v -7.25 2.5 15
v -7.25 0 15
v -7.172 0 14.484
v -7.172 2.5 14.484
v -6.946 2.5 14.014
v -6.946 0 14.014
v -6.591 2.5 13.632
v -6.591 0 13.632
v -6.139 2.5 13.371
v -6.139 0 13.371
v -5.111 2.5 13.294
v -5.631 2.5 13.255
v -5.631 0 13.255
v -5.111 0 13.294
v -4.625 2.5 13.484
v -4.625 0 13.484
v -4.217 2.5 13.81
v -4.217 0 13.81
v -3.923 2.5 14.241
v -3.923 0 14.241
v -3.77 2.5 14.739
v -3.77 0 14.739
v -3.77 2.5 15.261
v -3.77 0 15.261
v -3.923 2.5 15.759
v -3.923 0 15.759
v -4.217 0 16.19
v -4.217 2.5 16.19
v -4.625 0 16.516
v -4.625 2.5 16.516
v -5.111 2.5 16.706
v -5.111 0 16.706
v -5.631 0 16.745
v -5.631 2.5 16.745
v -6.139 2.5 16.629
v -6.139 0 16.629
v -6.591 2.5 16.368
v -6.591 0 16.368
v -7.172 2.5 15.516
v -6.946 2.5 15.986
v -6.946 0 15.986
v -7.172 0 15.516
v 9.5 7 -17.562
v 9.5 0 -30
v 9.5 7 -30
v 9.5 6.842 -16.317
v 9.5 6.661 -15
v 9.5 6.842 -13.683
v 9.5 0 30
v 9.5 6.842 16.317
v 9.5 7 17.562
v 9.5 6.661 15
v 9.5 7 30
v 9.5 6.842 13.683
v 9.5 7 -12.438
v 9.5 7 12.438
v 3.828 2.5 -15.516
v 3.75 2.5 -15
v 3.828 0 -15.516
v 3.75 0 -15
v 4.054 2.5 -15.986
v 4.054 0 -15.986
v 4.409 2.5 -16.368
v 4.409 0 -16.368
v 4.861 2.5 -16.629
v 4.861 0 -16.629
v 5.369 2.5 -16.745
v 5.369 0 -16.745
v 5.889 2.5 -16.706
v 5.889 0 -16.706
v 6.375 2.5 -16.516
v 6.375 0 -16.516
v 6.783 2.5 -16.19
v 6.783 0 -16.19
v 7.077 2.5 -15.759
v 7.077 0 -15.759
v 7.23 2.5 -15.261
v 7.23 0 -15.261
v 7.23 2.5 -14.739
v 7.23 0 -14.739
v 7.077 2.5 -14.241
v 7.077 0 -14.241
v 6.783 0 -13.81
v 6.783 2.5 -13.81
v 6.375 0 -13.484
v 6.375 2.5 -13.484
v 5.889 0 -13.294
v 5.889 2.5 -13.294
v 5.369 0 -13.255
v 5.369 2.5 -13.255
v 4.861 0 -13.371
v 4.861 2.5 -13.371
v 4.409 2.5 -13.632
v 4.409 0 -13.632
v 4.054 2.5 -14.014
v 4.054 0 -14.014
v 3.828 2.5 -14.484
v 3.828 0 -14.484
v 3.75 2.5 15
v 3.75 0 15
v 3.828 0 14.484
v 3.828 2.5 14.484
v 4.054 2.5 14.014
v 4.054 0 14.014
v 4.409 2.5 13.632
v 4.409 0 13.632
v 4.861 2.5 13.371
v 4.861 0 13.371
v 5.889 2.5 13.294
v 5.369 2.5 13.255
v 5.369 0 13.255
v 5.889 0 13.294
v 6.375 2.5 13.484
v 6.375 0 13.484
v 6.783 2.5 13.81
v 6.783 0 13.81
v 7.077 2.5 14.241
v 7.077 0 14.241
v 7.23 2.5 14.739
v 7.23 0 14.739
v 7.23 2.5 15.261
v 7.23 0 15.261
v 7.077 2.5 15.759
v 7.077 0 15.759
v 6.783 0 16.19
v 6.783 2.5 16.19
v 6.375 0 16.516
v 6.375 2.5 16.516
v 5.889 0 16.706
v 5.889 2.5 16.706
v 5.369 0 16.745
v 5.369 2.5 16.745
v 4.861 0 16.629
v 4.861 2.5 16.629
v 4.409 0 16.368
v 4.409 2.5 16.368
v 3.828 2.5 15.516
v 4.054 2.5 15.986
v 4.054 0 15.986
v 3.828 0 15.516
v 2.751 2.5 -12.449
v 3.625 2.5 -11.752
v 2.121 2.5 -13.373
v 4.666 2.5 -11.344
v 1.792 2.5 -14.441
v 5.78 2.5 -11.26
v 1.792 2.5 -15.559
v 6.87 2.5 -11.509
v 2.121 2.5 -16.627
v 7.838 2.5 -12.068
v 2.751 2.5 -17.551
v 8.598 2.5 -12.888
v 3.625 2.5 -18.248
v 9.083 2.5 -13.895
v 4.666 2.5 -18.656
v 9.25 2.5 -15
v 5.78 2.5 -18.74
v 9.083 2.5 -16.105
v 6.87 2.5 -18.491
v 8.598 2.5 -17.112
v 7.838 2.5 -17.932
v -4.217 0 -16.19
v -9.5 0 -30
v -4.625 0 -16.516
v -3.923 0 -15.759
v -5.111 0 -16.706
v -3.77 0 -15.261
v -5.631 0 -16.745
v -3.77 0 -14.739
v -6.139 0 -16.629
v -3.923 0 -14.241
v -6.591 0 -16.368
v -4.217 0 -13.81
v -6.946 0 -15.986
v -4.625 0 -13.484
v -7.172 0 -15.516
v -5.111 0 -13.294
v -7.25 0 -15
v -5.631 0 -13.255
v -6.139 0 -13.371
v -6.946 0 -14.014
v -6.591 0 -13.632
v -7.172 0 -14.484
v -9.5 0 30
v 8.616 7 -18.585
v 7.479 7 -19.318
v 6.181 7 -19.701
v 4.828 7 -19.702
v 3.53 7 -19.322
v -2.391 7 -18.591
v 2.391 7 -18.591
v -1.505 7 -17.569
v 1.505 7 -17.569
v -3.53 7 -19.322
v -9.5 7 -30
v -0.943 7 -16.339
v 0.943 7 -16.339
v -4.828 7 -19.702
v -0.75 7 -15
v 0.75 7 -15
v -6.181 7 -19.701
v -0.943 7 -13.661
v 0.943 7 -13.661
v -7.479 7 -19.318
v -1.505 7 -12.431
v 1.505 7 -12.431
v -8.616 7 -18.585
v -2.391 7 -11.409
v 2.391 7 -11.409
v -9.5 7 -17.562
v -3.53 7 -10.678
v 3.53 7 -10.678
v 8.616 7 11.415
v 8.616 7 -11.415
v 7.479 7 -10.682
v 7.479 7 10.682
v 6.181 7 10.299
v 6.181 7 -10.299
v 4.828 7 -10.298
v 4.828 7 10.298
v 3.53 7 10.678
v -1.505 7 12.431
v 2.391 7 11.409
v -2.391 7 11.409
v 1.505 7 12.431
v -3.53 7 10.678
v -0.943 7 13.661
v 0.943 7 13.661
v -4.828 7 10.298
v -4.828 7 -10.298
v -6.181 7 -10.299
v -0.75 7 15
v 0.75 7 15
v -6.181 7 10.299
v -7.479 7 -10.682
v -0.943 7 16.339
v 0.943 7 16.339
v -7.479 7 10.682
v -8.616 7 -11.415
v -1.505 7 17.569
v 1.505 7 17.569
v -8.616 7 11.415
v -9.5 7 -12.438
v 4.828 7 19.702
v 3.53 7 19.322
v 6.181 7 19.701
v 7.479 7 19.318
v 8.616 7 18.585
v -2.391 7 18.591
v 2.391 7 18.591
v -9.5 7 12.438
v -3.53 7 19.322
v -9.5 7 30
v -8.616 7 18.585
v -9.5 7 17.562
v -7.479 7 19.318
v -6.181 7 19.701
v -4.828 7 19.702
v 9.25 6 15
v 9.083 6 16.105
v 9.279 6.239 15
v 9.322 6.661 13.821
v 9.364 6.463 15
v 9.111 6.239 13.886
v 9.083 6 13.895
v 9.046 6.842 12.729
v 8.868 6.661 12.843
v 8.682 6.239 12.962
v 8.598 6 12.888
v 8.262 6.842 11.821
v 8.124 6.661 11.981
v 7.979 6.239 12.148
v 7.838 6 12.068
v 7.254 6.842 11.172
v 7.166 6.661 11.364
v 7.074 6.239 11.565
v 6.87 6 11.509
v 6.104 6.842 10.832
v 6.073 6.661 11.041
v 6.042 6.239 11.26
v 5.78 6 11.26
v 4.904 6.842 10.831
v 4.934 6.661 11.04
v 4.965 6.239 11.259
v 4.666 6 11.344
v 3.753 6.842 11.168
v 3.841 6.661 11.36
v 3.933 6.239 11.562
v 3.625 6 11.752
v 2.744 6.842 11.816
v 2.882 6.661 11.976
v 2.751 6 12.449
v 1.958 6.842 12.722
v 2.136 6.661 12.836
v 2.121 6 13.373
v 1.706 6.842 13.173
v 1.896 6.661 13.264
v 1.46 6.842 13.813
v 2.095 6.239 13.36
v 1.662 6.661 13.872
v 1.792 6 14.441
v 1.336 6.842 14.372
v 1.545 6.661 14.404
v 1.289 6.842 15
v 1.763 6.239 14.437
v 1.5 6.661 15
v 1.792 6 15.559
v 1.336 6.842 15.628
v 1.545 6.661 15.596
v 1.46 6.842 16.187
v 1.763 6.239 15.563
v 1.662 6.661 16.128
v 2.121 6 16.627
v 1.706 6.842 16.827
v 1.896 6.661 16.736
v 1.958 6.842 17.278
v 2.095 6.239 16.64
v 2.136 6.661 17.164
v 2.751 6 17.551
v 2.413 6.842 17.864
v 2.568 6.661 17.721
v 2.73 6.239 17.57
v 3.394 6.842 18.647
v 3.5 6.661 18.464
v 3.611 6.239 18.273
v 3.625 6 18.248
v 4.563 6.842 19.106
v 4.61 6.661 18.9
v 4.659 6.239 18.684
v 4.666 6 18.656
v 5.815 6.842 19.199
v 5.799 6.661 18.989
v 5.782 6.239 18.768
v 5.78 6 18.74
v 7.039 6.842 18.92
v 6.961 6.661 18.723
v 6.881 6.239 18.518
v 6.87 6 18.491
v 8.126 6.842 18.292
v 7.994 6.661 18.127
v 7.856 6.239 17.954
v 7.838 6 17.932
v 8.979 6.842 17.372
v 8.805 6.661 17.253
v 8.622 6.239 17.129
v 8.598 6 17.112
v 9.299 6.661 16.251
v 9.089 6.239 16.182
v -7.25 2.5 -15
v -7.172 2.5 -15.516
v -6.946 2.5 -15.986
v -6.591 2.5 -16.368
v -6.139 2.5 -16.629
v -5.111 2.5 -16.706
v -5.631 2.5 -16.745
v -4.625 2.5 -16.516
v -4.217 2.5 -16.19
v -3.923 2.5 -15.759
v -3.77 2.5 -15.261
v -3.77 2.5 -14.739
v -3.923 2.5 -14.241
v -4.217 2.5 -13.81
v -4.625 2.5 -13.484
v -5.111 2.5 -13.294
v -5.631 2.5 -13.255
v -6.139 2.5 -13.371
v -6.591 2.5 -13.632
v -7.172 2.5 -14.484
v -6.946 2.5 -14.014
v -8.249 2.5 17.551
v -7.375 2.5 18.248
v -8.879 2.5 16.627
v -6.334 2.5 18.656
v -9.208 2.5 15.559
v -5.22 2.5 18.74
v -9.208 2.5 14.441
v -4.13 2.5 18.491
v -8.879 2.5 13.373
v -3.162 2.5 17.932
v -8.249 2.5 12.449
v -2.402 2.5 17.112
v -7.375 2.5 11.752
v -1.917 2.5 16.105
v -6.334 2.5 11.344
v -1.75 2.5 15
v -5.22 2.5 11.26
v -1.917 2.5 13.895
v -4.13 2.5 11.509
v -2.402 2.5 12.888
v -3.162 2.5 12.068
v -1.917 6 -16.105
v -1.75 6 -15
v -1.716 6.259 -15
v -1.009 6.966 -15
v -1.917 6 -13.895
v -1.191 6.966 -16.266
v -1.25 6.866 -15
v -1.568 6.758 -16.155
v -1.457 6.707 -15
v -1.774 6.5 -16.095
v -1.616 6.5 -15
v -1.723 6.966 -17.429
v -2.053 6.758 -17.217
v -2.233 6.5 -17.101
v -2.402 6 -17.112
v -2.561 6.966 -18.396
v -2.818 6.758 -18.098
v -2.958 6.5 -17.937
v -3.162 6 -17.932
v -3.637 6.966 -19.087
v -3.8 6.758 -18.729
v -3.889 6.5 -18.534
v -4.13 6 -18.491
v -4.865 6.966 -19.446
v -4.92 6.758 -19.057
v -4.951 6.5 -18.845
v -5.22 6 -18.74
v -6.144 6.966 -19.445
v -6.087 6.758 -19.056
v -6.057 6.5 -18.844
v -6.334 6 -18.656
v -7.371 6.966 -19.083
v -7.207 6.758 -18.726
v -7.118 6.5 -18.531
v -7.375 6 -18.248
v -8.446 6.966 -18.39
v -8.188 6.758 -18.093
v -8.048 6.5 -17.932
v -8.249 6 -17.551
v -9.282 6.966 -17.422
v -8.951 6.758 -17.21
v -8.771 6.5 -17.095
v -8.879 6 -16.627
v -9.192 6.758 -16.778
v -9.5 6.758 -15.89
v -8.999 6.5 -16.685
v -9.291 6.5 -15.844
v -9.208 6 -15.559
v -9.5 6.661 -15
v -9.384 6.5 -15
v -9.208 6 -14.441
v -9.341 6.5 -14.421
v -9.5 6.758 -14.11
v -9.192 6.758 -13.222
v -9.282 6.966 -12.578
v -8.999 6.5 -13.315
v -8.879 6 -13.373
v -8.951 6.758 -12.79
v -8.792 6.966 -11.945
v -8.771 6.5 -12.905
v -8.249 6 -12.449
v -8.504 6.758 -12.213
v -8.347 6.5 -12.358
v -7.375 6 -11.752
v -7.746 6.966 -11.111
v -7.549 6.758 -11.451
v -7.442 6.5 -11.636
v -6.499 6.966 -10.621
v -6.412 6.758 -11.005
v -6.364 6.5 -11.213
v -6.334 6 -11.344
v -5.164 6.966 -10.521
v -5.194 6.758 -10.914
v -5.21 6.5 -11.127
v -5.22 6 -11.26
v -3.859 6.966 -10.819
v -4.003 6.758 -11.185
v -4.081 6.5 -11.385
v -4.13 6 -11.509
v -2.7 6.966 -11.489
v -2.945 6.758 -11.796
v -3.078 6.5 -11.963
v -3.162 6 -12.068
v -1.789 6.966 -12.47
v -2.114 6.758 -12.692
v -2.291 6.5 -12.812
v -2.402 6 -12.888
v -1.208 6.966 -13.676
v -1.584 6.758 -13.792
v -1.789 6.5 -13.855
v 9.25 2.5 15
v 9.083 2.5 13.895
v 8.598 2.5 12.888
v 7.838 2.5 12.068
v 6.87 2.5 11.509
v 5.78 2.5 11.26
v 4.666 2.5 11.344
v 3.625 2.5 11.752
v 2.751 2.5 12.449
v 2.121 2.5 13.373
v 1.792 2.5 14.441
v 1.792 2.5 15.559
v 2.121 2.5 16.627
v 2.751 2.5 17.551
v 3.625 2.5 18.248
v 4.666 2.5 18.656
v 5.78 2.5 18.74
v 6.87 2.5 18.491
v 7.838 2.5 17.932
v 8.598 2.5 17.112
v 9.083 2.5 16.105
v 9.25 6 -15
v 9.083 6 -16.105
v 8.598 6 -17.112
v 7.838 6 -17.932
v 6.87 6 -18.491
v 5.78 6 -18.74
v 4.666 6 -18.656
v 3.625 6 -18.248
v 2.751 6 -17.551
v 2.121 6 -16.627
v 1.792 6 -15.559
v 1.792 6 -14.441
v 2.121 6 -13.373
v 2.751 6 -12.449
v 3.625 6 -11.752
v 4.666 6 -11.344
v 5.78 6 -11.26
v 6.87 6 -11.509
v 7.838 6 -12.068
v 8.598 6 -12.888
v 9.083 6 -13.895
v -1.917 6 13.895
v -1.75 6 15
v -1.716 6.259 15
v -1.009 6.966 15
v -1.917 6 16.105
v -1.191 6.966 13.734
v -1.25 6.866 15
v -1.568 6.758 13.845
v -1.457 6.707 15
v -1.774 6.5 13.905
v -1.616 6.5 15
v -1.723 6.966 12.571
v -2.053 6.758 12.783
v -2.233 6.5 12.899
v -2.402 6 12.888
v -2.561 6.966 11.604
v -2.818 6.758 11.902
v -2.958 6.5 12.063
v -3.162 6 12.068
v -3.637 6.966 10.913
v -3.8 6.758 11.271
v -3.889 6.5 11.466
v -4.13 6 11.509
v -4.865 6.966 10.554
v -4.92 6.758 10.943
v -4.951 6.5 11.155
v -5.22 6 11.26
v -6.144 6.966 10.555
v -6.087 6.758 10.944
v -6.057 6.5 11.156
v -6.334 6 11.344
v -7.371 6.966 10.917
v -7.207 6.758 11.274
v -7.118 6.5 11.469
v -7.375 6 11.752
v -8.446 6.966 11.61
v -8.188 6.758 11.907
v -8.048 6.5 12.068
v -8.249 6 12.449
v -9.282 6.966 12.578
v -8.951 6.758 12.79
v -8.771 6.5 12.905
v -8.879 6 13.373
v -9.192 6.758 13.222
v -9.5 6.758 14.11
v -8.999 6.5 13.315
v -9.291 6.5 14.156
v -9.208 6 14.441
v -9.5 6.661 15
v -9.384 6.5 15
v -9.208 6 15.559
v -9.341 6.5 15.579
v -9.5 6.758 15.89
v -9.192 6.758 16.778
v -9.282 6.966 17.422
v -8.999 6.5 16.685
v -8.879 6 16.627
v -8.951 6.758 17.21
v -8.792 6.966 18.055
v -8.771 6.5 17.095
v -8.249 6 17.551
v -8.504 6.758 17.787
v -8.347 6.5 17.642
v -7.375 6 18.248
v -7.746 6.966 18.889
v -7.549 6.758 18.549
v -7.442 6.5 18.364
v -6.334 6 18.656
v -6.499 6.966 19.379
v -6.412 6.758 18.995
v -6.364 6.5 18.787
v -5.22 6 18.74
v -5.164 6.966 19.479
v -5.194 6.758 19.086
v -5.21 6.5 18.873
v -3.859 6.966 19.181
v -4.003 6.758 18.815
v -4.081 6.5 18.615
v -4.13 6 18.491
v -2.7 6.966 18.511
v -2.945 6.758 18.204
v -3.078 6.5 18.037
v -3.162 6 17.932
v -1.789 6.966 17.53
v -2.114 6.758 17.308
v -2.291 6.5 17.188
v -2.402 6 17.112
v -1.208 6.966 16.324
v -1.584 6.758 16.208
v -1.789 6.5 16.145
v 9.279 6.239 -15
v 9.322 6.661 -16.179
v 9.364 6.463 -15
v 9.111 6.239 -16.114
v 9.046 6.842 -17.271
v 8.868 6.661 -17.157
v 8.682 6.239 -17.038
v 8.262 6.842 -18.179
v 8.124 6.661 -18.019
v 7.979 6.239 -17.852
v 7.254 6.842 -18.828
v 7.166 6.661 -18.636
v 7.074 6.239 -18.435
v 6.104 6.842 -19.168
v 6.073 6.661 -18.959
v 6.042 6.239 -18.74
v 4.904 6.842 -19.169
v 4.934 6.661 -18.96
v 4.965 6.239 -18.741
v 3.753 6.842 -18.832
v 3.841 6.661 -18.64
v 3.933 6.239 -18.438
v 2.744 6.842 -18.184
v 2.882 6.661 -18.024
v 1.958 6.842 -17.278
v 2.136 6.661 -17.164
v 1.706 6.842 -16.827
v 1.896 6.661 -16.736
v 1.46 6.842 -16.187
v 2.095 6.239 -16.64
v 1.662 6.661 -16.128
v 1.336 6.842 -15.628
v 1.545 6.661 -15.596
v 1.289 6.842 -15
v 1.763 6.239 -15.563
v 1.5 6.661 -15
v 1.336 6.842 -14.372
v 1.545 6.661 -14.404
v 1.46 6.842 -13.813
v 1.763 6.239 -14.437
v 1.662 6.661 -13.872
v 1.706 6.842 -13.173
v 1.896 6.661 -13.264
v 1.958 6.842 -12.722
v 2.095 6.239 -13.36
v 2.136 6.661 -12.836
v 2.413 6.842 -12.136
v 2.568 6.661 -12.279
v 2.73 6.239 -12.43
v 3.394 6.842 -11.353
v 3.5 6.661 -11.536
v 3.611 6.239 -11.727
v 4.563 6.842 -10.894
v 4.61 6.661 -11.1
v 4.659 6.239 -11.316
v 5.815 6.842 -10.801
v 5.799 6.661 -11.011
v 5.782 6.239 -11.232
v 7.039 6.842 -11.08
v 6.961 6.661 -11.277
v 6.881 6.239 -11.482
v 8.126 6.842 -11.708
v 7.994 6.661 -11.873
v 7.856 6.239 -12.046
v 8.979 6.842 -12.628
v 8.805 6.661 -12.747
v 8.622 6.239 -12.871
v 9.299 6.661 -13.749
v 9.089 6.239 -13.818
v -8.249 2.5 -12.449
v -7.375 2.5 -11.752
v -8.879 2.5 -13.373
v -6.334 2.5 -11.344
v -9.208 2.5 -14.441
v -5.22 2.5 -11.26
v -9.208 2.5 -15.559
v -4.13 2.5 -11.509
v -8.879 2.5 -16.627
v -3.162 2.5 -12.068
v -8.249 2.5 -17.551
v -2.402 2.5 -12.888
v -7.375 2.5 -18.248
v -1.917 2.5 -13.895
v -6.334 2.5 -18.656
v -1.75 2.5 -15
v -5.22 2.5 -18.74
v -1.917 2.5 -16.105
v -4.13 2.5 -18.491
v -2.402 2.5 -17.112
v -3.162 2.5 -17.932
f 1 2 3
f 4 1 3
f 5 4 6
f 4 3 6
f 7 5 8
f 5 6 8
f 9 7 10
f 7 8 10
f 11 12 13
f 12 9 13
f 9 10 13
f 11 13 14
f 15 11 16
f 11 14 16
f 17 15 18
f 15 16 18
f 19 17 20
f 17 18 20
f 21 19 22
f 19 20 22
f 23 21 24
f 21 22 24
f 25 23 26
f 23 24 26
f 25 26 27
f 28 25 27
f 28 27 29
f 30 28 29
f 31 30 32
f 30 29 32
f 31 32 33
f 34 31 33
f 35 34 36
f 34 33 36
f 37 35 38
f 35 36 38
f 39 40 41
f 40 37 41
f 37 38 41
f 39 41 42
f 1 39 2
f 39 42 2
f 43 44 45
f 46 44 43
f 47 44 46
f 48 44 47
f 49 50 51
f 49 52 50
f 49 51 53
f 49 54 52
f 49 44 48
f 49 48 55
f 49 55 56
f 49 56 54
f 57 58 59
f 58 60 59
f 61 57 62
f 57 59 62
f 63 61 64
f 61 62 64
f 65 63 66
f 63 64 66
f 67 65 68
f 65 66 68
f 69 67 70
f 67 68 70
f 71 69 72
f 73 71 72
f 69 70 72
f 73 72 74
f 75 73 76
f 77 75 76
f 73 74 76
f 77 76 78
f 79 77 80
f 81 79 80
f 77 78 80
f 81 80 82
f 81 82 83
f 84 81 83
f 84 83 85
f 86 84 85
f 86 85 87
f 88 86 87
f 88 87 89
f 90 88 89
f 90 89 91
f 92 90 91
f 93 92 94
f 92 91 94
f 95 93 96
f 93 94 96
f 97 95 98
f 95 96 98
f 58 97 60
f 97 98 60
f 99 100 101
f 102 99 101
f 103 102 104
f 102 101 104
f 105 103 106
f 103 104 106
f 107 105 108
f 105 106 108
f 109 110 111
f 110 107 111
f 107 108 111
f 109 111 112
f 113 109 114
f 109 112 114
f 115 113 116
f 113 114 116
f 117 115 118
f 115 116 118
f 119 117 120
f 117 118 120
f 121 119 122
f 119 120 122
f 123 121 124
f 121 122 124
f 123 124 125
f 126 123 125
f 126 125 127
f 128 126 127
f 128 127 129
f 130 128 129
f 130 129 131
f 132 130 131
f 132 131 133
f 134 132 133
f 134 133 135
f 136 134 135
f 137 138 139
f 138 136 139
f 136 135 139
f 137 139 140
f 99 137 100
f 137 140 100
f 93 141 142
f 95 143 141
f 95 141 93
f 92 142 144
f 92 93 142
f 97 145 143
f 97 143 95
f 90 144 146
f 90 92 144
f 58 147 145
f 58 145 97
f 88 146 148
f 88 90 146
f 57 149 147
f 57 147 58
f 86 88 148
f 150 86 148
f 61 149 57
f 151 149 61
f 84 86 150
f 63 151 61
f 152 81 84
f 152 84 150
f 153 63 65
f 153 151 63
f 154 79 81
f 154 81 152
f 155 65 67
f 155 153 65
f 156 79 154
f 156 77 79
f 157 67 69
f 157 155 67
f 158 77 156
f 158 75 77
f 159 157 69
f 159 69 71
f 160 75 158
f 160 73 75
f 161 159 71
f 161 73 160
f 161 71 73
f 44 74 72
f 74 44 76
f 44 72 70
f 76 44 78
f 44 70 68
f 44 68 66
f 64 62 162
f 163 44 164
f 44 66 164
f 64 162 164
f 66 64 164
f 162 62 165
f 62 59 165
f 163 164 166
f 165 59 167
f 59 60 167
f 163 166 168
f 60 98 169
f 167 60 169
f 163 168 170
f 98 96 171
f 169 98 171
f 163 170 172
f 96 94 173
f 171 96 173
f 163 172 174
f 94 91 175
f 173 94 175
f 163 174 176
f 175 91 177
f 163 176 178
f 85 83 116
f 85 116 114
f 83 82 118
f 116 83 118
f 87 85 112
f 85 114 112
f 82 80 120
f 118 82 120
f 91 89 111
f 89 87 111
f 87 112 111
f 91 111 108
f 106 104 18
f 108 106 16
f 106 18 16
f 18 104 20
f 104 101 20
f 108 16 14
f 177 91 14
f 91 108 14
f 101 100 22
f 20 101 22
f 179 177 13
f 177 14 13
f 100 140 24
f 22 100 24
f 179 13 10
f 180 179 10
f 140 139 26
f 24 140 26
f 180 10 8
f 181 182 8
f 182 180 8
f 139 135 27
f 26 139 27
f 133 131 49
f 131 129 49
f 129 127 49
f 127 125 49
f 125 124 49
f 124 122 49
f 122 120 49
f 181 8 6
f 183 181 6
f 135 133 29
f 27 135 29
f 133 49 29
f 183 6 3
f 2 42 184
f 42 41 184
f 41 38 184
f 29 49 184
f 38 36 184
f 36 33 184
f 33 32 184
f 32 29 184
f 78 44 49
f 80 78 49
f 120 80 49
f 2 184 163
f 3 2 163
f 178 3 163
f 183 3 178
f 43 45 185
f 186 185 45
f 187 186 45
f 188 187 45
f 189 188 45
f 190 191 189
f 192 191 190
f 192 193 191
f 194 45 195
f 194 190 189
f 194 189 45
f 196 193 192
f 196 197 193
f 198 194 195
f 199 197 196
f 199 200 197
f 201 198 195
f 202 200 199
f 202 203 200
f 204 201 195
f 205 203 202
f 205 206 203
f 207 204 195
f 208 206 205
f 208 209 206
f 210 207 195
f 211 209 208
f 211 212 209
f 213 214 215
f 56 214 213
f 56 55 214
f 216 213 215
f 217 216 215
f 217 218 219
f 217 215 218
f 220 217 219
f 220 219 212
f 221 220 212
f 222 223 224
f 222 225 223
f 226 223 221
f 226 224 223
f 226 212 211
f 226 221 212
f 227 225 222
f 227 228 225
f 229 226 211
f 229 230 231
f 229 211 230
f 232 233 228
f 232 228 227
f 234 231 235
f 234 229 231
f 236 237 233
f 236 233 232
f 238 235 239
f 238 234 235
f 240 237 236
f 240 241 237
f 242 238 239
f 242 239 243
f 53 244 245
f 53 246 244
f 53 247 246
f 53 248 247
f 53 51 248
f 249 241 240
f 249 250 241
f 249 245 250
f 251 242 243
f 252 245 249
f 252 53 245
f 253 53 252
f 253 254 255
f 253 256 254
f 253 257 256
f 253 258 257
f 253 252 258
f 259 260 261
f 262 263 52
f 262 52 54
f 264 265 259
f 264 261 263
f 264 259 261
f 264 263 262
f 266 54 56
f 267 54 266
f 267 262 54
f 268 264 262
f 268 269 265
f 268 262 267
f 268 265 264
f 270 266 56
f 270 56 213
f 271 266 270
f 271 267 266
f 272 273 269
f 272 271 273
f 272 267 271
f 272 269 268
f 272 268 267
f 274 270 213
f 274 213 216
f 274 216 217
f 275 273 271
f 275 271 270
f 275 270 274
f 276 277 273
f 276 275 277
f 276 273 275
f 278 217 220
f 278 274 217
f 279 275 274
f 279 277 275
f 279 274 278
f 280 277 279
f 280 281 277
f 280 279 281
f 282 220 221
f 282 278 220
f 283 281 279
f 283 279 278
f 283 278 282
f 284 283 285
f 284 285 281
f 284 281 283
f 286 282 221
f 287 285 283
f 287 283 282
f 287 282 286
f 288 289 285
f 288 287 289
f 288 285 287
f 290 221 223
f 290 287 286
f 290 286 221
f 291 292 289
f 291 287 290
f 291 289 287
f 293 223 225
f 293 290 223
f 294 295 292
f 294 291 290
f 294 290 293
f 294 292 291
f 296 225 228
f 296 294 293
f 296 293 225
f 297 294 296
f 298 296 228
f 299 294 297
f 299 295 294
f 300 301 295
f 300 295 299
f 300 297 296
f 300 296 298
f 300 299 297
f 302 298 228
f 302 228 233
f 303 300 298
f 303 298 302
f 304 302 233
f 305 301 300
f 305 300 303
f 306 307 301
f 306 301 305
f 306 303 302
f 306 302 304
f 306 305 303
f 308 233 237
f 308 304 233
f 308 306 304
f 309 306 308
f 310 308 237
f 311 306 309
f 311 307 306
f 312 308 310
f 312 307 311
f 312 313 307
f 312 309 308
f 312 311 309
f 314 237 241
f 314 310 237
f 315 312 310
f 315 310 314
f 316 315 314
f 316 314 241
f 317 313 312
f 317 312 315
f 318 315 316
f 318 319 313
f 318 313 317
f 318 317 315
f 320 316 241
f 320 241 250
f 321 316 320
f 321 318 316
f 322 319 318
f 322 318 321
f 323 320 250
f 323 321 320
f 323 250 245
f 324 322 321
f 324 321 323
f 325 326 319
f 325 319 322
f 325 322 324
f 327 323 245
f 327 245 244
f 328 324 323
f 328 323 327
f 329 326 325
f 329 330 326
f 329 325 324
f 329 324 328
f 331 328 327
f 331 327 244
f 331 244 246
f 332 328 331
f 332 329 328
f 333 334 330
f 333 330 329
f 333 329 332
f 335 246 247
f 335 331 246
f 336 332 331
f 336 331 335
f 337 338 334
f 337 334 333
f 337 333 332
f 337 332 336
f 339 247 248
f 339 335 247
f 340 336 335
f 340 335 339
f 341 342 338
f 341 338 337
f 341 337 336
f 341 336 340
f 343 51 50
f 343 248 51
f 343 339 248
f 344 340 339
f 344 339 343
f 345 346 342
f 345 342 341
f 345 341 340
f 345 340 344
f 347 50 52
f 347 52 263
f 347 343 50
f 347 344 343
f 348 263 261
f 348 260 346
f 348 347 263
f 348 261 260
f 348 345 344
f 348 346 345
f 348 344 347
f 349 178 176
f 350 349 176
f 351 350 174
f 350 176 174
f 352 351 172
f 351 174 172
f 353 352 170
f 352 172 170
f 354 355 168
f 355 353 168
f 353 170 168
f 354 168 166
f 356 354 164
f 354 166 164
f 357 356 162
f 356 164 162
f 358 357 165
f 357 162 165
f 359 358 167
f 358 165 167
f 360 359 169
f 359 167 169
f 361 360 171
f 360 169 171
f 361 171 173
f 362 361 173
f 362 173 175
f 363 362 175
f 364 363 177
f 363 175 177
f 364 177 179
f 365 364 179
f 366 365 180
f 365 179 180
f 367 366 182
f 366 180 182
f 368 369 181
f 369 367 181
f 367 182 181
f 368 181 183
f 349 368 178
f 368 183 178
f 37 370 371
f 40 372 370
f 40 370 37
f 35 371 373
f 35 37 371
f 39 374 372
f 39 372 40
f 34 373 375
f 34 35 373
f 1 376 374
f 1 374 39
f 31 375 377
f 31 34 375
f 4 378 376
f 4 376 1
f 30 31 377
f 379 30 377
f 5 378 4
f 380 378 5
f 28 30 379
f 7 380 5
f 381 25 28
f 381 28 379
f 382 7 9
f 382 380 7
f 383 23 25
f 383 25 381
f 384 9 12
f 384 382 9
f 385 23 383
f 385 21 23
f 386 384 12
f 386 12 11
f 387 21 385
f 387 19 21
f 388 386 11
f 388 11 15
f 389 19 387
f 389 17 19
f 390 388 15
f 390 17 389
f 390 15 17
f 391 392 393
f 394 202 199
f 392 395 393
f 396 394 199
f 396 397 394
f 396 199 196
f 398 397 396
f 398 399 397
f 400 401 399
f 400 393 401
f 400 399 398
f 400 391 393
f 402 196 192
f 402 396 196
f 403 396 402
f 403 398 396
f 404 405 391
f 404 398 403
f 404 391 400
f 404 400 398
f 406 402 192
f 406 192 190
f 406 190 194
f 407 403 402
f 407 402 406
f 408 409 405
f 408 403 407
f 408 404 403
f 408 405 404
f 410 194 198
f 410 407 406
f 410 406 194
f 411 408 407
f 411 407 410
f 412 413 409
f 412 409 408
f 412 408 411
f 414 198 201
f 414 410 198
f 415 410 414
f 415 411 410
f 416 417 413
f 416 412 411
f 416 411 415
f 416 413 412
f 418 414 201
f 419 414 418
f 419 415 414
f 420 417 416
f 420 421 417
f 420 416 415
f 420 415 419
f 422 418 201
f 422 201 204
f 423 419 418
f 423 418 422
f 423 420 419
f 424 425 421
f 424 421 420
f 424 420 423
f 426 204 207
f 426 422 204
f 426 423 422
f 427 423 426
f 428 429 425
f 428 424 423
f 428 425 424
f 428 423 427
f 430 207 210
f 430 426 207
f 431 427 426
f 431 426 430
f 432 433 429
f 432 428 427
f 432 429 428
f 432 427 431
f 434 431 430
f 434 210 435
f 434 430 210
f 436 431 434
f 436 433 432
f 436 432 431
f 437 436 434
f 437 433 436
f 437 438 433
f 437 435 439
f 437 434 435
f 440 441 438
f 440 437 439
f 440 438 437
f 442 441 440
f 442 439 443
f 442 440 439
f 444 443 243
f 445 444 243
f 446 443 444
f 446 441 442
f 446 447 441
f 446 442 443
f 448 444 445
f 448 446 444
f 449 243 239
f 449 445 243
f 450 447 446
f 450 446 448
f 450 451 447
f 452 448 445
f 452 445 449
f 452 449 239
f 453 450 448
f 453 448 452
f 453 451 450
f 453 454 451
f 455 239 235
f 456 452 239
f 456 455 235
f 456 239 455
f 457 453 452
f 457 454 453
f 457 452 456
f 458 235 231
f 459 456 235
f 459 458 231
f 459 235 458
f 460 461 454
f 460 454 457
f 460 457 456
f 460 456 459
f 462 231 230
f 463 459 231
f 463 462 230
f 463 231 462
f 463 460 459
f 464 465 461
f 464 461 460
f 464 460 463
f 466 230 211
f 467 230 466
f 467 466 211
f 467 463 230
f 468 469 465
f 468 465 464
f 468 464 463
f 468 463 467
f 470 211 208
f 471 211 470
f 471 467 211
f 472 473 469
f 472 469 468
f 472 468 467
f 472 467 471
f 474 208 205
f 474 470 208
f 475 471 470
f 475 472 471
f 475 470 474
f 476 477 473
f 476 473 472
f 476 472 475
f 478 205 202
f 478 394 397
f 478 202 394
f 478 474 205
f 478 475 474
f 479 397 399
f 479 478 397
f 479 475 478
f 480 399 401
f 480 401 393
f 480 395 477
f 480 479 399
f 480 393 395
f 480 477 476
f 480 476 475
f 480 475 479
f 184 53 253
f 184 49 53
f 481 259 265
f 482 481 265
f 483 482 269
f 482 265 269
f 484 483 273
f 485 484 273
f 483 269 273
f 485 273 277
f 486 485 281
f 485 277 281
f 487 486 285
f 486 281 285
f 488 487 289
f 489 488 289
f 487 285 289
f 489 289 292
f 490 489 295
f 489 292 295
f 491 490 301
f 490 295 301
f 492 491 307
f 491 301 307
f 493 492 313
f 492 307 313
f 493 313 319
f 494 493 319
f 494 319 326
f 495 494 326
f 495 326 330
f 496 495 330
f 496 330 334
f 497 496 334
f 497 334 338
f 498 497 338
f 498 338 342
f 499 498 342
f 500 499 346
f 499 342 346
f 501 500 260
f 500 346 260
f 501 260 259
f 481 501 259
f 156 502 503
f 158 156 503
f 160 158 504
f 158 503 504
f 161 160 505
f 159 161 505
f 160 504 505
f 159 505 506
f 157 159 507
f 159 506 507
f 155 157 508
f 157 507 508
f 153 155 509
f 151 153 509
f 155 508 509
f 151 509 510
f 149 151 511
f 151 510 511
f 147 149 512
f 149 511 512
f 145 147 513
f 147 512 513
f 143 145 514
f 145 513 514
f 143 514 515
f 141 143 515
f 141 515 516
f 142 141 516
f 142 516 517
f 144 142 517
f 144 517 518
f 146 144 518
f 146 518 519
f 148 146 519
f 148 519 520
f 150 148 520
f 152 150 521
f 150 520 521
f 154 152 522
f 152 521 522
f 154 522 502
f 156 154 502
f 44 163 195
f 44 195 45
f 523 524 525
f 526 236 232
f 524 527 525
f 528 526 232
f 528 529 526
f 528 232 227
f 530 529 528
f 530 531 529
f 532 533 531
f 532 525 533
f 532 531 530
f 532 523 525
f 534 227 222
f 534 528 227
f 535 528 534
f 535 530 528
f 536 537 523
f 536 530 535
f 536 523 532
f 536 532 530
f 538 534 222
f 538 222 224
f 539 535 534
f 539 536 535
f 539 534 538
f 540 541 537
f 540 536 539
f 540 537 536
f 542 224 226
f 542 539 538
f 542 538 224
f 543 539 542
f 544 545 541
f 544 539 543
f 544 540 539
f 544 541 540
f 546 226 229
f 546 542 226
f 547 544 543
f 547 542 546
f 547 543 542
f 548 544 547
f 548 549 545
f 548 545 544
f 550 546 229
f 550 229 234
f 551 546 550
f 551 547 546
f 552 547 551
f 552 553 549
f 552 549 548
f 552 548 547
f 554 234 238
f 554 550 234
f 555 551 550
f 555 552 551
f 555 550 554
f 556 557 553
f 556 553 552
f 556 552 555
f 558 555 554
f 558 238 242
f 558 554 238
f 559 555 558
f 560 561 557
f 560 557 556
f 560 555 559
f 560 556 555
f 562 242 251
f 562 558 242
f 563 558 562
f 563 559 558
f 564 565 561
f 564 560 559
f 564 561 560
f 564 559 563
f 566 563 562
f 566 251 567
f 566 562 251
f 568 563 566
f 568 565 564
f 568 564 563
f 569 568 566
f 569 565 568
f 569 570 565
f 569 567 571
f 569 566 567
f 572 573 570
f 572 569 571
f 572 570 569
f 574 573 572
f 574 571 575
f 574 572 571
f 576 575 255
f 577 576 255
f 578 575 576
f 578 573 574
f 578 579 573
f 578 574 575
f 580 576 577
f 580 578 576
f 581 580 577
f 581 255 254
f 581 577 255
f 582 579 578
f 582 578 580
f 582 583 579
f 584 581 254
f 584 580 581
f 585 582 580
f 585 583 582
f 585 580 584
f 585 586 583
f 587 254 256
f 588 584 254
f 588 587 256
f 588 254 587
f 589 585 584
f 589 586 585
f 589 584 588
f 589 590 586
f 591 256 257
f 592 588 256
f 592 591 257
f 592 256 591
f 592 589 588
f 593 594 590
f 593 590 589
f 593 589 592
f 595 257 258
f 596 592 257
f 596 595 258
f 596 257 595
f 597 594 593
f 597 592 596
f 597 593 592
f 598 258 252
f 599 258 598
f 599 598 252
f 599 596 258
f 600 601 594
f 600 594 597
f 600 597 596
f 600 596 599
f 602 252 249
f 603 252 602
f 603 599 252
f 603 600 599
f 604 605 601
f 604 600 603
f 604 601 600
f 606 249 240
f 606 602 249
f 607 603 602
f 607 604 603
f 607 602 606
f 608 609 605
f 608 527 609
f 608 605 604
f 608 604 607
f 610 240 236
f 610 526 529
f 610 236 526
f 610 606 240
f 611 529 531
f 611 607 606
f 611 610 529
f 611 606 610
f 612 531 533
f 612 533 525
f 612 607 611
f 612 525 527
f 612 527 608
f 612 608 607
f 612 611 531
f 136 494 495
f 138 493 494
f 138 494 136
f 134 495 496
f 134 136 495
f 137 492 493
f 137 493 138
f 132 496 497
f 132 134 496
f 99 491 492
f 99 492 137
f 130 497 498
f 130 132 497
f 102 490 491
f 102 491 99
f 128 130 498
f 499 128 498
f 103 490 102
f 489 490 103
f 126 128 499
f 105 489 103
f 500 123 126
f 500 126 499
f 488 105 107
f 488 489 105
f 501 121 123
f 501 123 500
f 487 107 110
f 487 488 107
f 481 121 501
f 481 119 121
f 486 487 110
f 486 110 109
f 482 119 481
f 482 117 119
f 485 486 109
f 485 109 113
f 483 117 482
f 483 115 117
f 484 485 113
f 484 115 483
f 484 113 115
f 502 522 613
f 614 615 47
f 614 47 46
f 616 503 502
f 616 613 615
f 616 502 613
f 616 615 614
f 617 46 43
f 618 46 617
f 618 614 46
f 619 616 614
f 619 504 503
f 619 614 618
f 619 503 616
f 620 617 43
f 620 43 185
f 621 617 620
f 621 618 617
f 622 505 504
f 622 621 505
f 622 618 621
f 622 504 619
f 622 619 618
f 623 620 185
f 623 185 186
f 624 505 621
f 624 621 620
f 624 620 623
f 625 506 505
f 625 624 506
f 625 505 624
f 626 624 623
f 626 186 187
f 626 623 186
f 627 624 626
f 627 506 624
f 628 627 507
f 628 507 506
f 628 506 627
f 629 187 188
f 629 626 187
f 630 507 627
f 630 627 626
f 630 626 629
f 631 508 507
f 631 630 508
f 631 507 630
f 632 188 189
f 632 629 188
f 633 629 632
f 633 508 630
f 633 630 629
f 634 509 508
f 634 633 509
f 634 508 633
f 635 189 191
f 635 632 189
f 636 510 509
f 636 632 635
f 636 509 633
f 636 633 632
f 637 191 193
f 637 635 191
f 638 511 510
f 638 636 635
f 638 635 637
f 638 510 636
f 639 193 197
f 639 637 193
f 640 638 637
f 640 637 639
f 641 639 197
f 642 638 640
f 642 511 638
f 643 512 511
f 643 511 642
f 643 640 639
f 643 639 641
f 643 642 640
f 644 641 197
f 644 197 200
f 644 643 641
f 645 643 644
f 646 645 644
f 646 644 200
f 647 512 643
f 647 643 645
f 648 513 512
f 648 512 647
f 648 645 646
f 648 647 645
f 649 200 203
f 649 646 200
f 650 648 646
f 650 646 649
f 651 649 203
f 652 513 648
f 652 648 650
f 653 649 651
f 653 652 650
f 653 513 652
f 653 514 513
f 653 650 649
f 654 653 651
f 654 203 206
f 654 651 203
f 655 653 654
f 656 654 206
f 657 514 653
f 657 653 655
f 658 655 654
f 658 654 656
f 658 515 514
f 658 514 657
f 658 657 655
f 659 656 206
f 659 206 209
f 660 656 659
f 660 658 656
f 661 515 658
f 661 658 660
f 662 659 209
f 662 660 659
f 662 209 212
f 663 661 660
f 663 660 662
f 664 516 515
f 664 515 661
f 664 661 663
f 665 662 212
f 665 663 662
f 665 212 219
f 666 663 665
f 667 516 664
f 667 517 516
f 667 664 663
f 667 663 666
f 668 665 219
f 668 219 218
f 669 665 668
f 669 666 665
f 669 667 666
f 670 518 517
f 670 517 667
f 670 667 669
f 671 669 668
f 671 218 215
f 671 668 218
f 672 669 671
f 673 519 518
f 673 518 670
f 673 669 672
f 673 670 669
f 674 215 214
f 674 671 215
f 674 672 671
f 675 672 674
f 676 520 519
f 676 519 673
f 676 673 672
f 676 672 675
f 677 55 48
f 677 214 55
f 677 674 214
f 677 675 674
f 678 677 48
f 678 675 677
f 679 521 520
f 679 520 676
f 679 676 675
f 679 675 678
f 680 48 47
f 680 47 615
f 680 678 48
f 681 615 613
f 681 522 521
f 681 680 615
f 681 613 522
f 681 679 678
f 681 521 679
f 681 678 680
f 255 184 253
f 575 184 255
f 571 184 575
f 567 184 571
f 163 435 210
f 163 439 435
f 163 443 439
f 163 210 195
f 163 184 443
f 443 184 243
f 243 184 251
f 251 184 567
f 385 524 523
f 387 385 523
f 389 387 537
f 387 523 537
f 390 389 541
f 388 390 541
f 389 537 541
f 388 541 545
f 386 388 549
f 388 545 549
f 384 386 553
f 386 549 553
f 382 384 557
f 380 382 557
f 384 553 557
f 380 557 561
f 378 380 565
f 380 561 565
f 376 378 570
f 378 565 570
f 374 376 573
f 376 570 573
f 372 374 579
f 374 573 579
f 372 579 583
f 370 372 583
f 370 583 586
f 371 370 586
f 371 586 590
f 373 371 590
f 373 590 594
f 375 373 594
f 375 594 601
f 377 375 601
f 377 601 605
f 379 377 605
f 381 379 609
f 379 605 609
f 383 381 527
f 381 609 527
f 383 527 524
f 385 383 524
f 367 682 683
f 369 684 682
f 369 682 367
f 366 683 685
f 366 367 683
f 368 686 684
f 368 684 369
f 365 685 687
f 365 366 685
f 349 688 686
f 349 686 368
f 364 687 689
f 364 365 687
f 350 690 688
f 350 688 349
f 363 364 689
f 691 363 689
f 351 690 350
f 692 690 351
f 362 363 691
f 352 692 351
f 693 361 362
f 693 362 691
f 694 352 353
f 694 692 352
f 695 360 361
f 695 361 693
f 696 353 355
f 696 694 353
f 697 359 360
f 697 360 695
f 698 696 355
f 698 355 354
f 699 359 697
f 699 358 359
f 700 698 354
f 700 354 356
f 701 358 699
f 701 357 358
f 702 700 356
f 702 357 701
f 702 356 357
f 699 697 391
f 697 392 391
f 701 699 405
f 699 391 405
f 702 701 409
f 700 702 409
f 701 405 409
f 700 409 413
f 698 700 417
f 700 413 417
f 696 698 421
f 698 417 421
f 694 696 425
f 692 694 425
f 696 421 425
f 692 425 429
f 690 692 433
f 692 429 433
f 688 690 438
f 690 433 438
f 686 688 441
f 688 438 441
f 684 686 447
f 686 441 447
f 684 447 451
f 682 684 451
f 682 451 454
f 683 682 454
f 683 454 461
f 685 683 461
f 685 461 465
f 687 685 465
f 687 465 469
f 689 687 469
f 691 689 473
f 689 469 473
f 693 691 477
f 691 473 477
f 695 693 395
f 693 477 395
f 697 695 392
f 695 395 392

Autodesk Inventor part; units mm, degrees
ref_plane "YZ Plane" through (0, 0, 0) normal (1, 0, 0) x (0, 1, 0)
ref_plane "XZ Plane" through (0, 0, 0) normal (0, 1, 0) x (-1, 0, 0)
ref_plane "XY Plane" through (0, 0, 0) normal (0, 0, 1) x (1, 0, 0)
sketch "Esquisse1" plane through (0, 0, 0) normal (0, 1, 0) x (-1, 0, 0)
  line L0 (-9.5, 30) -> (9.5, 30)
  line L1 (9.5, 30) -> (9.5, -30)
  line L2 (9.5, -30) -> (-9.5, -30)
  line L3 (-9.5, -30) -> (-9.5, 30)
  line L4 (-9.5, 30) -> (9.5, -30) construction
  line L5 (9.5, 30) -> (-9.5, -30) construction
  circle A0 centre (5.5, 15) radius 1.75
  circle A1 centre (5.5, -15) radius 1.75
  line L6 (0, 32.5338) -> (0, -37.7206)
  circle A2 centre (-5.5, 15) radius 1.75
  circle A3 centre (-5.5, -15) radius 1.75
  point P0 (0, 0)
  dimension "d0" = 19
  dimension "d1" = 60
  dimension "d2" = 15
  dimension "d3" = 15
  dimension "d4" = 3.5
  dimension "d11" = 4
  dimension "d12" = 4
extrude "Extrusion1" add sketch "Esquisse1" along normal blind 7
sketch "Esquisse2" plane through (0, 7, 0) normal (0, 1, 0) x (1, 0, 0)
  circle A0 centre (-5.5, -15) radius 1.75 projected
  circle A1 centre (-5.5, -15) radius 3.75
  circle A2 centre (-5.5, 15) radius 1.75 projected
  circle A3 centre (-5.5, 15) radius 3.75
  line L0 (0, -33.1726) -> (0, 42.5186)
  circle A4 centre (5.5, -15) radius 1.75
  circle A5 centre (5.5, -15) radius 3.75
  circle A6 centre (5.5, 15) radius 1.75
  circle A7 centre (5.5, 15) radius 3.75
  point P0 (0, 0)
  dimension "d7" = 7.5
extrude "Extrusion2" cut sketch "Esquisse2" against normal blind 4.5 contours A1 | A3 | A5 | A6 | A7
fillet "Congé2" radius 1 4 edges at (-9.25, 7, -15) (1.75, 7, -15) (-9.25, 7, 15) (1.75, 7, 15)
properties part number "attache_cadre"
